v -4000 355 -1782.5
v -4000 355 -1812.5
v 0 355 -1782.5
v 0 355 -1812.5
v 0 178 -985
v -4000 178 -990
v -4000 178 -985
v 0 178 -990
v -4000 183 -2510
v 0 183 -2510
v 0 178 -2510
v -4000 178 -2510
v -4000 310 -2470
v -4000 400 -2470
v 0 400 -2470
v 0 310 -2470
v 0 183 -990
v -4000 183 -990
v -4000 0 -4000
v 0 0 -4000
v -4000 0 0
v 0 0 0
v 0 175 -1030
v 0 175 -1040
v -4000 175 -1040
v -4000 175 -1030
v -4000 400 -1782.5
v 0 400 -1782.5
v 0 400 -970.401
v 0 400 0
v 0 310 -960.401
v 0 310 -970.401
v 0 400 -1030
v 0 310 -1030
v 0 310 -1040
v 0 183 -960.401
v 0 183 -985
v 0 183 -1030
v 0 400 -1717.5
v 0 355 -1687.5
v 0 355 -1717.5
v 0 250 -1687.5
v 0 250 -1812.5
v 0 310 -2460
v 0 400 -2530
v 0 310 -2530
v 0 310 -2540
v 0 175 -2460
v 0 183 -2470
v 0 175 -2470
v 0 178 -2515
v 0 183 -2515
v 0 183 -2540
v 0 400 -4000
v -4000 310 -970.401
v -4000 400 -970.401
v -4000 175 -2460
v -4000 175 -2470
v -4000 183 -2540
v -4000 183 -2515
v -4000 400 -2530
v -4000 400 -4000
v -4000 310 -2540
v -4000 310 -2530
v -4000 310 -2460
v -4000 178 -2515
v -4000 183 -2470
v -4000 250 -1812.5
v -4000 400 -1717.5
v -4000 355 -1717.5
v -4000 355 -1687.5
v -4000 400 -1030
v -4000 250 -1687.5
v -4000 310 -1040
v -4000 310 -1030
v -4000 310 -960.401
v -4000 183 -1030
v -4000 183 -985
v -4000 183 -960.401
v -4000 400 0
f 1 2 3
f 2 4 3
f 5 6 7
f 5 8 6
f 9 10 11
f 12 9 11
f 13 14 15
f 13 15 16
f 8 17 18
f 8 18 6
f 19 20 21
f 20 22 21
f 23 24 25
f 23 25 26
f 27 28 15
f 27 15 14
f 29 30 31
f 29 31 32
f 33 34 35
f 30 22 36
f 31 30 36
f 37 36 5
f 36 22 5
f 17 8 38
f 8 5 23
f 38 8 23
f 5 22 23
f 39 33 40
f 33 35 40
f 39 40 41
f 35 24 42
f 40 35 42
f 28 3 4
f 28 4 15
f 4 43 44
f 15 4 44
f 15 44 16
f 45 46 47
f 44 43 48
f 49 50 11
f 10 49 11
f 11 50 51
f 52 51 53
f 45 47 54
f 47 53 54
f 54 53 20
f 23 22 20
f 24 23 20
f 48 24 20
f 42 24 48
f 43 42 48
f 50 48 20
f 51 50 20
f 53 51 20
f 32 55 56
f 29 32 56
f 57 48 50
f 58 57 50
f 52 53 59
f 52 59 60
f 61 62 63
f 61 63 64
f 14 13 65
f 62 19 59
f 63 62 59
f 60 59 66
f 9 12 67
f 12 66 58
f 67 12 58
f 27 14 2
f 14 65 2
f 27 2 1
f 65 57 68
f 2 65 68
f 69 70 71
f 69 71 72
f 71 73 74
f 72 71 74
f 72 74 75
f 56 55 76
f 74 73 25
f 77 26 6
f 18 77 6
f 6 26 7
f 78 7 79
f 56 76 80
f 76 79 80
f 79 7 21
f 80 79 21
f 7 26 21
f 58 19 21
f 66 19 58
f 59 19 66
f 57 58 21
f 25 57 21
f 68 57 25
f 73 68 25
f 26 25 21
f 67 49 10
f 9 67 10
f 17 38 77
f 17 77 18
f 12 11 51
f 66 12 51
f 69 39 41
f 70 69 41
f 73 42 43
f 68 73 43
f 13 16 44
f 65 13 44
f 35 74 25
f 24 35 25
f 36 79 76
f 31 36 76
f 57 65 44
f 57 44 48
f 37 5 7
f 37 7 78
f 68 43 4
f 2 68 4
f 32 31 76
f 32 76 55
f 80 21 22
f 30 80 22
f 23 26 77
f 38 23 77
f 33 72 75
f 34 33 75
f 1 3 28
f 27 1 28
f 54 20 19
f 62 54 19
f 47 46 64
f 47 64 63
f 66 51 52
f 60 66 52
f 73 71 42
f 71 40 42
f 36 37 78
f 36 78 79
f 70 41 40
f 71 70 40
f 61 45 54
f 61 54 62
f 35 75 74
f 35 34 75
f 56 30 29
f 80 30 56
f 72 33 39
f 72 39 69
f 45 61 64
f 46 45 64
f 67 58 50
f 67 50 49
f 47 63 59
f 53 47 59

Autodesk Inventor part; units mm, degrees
ref_plane "YZ Plane" through (0, 0, 0) normal (1, 0, 0) x (0, 1, 0)
ref_plane "XZ Plane" through (0, 0, 0) normal (0, 1, 0) x (-1, 0, 0)
ref_plane "XY Plane" through (0, 0, 0) normal (0, 0, 1) x (1, 0, 0)
sketch "Sketch1" plane through (0, 0, 0) normal (0, 1, 0) x (-1, 0, 0)
  line L0 (0, 0) -> (0, -4000)
  line L1 (0, -4000) -> (4000, -4000)
  line L2 (4000, -4000) -> (4000, 0)
  line L3 (4000, 0) -> (0, 0)
  dimension "d1" = 4000
  dimension "d2" = 4000
  dimension "d3" = 4000
extrude "Extrusion1" add sketch "Sketch1" along normal blind 400
sketch "Sketch2" plane through (0, 0, 0) normal (1, 0, 0) x (0, 0, -1)
  line L0 (4000, 400) -> (0, 400) projected
  line L1 (0, 400) -> (1000, 400)
  line L2 (1000, 400) -> (2500, 400)
  line L3 (1000, 400) -> (1030, 400)
  line L4 (1030, 400) -> (1030, 310)
  line L5 (1030, 310) -> (1040, 310)
  line L6 (1040, 310) -> (1040, 175)
  line L7 (960.401, 183) -> (960.401, 310)
  line L8 (960.401, 310) -> (970.401, 310)
  line L9 (970.401, 310) -> (970.401, 400)
  line L10 (1040, 175) -> (1030, 175)
  line L11 (1030, 175) -> (1030, 183)
  line L12 (1030, 183) -> (990, 183)
  line L13 (990, 183) -> (990, 178)
  line L14 (990, 178) -> (985, 178)
  line L15 (985, 178) -> (985, 183)
  line L16 (985, 183) -> (960.401, 183)
  line L17 (2500, 400) -> (2530, 400)
  line L18 (2530, 400) -> (2470, 400)
  line L19 (2470, 400) -> (2470, 310)
  line L20 (2470, 310) -> (2460, 310)
  line L21 (2460, 310) -> (2460, 175)
  line L22 (2460, 175) -> (2470, 175)
  line L23 (2470, 175) -> (2470, 183)
  line L24 (2470, 183) -> (2510, 183)
  line L25 (2510, 183) -> (2510, 178)
  line L26 (2510, 178) -> (2515, 178)
  line L27 (2515, 178) -> (2515, 183)
  line L28 (2530, 400) -> (2530, 310)
  line L29 (2530, 310) -> (2540, 310)
  line L30 (2540, 310) -> (2540, 183)
  line L31 (2540, 183) -> (2515, 183)
  point P0 (0, 0)
  dimension "d6" = 1000
  dimension "d7" = 1500
  dimension "d8" = 30
  dimension "d9" = 90
  dimension "d10" = 10
  dimension "d11" = 135
  dimension "d12" = 80
  dimension "d13" = 10
  dimension "d14" = 10
  dimension "d15" = 8
  dimension "d16" = 40
  dimension "d17" = 5
  dimension "d18" = 5
  dimension "d19" = 5
  dimension "d20" = 30
  dimension "d21" = 60
  dimension "d22" = 90
  dimension "d23" = 10
  dimension "d24" = 135
  dimension "d25" = 10
  dimension "d26" = 8
  dimension "d27" = 40
  dimension "d28" = 5
  dimension "d29" = 5
  dimension "d30" = 10
extrude "Extrusion2" cut sketch "Sketch2" against normal blind 4000
sketch "Sketch3" plane through (0, 0, 0) normal (1, 0, 0) x (0, 0, -1)
  line L0 (0, 400) -> (970.401, 400) projected
  line L1 (0, 400) -> (1750, 400)
  line L2 (1030, 400) -> (2470, 400) projected
  line L3 (1782.5, 400) -> (1717.5, 400)
  line L4 (1717.5, 400) -> (1717.5, 355)
  line L5 (1717.5, 355) -> (1687.5, 355)
  line L6 (1687.5, 355) -> (1687.5, 250)
  line L7 (1687.5, 250) -> (1812.5, 250)
  line L8 (1812.5, 250) -> (1812.5, 355)
  line L9 (1812.5, 355) -> (1782.5, 355)
  line L10 (1782.5, 355) -> (1782.5, 400)
  point P0 (0, 0)
  dimension "d33" = 1750
  dimension "d34" = 32.5
  dimension "d35" = 65
  dimension "d36" = 45
  dimension "d37" = 30
  dimension "d38" = 105
  dimension "d39" = 125
  dimension "d40" = 30
extrude "Extrusion3" cut sketch "Sketch3" against normal blind 4000
properties part number "Pavement" material "Concrete"
